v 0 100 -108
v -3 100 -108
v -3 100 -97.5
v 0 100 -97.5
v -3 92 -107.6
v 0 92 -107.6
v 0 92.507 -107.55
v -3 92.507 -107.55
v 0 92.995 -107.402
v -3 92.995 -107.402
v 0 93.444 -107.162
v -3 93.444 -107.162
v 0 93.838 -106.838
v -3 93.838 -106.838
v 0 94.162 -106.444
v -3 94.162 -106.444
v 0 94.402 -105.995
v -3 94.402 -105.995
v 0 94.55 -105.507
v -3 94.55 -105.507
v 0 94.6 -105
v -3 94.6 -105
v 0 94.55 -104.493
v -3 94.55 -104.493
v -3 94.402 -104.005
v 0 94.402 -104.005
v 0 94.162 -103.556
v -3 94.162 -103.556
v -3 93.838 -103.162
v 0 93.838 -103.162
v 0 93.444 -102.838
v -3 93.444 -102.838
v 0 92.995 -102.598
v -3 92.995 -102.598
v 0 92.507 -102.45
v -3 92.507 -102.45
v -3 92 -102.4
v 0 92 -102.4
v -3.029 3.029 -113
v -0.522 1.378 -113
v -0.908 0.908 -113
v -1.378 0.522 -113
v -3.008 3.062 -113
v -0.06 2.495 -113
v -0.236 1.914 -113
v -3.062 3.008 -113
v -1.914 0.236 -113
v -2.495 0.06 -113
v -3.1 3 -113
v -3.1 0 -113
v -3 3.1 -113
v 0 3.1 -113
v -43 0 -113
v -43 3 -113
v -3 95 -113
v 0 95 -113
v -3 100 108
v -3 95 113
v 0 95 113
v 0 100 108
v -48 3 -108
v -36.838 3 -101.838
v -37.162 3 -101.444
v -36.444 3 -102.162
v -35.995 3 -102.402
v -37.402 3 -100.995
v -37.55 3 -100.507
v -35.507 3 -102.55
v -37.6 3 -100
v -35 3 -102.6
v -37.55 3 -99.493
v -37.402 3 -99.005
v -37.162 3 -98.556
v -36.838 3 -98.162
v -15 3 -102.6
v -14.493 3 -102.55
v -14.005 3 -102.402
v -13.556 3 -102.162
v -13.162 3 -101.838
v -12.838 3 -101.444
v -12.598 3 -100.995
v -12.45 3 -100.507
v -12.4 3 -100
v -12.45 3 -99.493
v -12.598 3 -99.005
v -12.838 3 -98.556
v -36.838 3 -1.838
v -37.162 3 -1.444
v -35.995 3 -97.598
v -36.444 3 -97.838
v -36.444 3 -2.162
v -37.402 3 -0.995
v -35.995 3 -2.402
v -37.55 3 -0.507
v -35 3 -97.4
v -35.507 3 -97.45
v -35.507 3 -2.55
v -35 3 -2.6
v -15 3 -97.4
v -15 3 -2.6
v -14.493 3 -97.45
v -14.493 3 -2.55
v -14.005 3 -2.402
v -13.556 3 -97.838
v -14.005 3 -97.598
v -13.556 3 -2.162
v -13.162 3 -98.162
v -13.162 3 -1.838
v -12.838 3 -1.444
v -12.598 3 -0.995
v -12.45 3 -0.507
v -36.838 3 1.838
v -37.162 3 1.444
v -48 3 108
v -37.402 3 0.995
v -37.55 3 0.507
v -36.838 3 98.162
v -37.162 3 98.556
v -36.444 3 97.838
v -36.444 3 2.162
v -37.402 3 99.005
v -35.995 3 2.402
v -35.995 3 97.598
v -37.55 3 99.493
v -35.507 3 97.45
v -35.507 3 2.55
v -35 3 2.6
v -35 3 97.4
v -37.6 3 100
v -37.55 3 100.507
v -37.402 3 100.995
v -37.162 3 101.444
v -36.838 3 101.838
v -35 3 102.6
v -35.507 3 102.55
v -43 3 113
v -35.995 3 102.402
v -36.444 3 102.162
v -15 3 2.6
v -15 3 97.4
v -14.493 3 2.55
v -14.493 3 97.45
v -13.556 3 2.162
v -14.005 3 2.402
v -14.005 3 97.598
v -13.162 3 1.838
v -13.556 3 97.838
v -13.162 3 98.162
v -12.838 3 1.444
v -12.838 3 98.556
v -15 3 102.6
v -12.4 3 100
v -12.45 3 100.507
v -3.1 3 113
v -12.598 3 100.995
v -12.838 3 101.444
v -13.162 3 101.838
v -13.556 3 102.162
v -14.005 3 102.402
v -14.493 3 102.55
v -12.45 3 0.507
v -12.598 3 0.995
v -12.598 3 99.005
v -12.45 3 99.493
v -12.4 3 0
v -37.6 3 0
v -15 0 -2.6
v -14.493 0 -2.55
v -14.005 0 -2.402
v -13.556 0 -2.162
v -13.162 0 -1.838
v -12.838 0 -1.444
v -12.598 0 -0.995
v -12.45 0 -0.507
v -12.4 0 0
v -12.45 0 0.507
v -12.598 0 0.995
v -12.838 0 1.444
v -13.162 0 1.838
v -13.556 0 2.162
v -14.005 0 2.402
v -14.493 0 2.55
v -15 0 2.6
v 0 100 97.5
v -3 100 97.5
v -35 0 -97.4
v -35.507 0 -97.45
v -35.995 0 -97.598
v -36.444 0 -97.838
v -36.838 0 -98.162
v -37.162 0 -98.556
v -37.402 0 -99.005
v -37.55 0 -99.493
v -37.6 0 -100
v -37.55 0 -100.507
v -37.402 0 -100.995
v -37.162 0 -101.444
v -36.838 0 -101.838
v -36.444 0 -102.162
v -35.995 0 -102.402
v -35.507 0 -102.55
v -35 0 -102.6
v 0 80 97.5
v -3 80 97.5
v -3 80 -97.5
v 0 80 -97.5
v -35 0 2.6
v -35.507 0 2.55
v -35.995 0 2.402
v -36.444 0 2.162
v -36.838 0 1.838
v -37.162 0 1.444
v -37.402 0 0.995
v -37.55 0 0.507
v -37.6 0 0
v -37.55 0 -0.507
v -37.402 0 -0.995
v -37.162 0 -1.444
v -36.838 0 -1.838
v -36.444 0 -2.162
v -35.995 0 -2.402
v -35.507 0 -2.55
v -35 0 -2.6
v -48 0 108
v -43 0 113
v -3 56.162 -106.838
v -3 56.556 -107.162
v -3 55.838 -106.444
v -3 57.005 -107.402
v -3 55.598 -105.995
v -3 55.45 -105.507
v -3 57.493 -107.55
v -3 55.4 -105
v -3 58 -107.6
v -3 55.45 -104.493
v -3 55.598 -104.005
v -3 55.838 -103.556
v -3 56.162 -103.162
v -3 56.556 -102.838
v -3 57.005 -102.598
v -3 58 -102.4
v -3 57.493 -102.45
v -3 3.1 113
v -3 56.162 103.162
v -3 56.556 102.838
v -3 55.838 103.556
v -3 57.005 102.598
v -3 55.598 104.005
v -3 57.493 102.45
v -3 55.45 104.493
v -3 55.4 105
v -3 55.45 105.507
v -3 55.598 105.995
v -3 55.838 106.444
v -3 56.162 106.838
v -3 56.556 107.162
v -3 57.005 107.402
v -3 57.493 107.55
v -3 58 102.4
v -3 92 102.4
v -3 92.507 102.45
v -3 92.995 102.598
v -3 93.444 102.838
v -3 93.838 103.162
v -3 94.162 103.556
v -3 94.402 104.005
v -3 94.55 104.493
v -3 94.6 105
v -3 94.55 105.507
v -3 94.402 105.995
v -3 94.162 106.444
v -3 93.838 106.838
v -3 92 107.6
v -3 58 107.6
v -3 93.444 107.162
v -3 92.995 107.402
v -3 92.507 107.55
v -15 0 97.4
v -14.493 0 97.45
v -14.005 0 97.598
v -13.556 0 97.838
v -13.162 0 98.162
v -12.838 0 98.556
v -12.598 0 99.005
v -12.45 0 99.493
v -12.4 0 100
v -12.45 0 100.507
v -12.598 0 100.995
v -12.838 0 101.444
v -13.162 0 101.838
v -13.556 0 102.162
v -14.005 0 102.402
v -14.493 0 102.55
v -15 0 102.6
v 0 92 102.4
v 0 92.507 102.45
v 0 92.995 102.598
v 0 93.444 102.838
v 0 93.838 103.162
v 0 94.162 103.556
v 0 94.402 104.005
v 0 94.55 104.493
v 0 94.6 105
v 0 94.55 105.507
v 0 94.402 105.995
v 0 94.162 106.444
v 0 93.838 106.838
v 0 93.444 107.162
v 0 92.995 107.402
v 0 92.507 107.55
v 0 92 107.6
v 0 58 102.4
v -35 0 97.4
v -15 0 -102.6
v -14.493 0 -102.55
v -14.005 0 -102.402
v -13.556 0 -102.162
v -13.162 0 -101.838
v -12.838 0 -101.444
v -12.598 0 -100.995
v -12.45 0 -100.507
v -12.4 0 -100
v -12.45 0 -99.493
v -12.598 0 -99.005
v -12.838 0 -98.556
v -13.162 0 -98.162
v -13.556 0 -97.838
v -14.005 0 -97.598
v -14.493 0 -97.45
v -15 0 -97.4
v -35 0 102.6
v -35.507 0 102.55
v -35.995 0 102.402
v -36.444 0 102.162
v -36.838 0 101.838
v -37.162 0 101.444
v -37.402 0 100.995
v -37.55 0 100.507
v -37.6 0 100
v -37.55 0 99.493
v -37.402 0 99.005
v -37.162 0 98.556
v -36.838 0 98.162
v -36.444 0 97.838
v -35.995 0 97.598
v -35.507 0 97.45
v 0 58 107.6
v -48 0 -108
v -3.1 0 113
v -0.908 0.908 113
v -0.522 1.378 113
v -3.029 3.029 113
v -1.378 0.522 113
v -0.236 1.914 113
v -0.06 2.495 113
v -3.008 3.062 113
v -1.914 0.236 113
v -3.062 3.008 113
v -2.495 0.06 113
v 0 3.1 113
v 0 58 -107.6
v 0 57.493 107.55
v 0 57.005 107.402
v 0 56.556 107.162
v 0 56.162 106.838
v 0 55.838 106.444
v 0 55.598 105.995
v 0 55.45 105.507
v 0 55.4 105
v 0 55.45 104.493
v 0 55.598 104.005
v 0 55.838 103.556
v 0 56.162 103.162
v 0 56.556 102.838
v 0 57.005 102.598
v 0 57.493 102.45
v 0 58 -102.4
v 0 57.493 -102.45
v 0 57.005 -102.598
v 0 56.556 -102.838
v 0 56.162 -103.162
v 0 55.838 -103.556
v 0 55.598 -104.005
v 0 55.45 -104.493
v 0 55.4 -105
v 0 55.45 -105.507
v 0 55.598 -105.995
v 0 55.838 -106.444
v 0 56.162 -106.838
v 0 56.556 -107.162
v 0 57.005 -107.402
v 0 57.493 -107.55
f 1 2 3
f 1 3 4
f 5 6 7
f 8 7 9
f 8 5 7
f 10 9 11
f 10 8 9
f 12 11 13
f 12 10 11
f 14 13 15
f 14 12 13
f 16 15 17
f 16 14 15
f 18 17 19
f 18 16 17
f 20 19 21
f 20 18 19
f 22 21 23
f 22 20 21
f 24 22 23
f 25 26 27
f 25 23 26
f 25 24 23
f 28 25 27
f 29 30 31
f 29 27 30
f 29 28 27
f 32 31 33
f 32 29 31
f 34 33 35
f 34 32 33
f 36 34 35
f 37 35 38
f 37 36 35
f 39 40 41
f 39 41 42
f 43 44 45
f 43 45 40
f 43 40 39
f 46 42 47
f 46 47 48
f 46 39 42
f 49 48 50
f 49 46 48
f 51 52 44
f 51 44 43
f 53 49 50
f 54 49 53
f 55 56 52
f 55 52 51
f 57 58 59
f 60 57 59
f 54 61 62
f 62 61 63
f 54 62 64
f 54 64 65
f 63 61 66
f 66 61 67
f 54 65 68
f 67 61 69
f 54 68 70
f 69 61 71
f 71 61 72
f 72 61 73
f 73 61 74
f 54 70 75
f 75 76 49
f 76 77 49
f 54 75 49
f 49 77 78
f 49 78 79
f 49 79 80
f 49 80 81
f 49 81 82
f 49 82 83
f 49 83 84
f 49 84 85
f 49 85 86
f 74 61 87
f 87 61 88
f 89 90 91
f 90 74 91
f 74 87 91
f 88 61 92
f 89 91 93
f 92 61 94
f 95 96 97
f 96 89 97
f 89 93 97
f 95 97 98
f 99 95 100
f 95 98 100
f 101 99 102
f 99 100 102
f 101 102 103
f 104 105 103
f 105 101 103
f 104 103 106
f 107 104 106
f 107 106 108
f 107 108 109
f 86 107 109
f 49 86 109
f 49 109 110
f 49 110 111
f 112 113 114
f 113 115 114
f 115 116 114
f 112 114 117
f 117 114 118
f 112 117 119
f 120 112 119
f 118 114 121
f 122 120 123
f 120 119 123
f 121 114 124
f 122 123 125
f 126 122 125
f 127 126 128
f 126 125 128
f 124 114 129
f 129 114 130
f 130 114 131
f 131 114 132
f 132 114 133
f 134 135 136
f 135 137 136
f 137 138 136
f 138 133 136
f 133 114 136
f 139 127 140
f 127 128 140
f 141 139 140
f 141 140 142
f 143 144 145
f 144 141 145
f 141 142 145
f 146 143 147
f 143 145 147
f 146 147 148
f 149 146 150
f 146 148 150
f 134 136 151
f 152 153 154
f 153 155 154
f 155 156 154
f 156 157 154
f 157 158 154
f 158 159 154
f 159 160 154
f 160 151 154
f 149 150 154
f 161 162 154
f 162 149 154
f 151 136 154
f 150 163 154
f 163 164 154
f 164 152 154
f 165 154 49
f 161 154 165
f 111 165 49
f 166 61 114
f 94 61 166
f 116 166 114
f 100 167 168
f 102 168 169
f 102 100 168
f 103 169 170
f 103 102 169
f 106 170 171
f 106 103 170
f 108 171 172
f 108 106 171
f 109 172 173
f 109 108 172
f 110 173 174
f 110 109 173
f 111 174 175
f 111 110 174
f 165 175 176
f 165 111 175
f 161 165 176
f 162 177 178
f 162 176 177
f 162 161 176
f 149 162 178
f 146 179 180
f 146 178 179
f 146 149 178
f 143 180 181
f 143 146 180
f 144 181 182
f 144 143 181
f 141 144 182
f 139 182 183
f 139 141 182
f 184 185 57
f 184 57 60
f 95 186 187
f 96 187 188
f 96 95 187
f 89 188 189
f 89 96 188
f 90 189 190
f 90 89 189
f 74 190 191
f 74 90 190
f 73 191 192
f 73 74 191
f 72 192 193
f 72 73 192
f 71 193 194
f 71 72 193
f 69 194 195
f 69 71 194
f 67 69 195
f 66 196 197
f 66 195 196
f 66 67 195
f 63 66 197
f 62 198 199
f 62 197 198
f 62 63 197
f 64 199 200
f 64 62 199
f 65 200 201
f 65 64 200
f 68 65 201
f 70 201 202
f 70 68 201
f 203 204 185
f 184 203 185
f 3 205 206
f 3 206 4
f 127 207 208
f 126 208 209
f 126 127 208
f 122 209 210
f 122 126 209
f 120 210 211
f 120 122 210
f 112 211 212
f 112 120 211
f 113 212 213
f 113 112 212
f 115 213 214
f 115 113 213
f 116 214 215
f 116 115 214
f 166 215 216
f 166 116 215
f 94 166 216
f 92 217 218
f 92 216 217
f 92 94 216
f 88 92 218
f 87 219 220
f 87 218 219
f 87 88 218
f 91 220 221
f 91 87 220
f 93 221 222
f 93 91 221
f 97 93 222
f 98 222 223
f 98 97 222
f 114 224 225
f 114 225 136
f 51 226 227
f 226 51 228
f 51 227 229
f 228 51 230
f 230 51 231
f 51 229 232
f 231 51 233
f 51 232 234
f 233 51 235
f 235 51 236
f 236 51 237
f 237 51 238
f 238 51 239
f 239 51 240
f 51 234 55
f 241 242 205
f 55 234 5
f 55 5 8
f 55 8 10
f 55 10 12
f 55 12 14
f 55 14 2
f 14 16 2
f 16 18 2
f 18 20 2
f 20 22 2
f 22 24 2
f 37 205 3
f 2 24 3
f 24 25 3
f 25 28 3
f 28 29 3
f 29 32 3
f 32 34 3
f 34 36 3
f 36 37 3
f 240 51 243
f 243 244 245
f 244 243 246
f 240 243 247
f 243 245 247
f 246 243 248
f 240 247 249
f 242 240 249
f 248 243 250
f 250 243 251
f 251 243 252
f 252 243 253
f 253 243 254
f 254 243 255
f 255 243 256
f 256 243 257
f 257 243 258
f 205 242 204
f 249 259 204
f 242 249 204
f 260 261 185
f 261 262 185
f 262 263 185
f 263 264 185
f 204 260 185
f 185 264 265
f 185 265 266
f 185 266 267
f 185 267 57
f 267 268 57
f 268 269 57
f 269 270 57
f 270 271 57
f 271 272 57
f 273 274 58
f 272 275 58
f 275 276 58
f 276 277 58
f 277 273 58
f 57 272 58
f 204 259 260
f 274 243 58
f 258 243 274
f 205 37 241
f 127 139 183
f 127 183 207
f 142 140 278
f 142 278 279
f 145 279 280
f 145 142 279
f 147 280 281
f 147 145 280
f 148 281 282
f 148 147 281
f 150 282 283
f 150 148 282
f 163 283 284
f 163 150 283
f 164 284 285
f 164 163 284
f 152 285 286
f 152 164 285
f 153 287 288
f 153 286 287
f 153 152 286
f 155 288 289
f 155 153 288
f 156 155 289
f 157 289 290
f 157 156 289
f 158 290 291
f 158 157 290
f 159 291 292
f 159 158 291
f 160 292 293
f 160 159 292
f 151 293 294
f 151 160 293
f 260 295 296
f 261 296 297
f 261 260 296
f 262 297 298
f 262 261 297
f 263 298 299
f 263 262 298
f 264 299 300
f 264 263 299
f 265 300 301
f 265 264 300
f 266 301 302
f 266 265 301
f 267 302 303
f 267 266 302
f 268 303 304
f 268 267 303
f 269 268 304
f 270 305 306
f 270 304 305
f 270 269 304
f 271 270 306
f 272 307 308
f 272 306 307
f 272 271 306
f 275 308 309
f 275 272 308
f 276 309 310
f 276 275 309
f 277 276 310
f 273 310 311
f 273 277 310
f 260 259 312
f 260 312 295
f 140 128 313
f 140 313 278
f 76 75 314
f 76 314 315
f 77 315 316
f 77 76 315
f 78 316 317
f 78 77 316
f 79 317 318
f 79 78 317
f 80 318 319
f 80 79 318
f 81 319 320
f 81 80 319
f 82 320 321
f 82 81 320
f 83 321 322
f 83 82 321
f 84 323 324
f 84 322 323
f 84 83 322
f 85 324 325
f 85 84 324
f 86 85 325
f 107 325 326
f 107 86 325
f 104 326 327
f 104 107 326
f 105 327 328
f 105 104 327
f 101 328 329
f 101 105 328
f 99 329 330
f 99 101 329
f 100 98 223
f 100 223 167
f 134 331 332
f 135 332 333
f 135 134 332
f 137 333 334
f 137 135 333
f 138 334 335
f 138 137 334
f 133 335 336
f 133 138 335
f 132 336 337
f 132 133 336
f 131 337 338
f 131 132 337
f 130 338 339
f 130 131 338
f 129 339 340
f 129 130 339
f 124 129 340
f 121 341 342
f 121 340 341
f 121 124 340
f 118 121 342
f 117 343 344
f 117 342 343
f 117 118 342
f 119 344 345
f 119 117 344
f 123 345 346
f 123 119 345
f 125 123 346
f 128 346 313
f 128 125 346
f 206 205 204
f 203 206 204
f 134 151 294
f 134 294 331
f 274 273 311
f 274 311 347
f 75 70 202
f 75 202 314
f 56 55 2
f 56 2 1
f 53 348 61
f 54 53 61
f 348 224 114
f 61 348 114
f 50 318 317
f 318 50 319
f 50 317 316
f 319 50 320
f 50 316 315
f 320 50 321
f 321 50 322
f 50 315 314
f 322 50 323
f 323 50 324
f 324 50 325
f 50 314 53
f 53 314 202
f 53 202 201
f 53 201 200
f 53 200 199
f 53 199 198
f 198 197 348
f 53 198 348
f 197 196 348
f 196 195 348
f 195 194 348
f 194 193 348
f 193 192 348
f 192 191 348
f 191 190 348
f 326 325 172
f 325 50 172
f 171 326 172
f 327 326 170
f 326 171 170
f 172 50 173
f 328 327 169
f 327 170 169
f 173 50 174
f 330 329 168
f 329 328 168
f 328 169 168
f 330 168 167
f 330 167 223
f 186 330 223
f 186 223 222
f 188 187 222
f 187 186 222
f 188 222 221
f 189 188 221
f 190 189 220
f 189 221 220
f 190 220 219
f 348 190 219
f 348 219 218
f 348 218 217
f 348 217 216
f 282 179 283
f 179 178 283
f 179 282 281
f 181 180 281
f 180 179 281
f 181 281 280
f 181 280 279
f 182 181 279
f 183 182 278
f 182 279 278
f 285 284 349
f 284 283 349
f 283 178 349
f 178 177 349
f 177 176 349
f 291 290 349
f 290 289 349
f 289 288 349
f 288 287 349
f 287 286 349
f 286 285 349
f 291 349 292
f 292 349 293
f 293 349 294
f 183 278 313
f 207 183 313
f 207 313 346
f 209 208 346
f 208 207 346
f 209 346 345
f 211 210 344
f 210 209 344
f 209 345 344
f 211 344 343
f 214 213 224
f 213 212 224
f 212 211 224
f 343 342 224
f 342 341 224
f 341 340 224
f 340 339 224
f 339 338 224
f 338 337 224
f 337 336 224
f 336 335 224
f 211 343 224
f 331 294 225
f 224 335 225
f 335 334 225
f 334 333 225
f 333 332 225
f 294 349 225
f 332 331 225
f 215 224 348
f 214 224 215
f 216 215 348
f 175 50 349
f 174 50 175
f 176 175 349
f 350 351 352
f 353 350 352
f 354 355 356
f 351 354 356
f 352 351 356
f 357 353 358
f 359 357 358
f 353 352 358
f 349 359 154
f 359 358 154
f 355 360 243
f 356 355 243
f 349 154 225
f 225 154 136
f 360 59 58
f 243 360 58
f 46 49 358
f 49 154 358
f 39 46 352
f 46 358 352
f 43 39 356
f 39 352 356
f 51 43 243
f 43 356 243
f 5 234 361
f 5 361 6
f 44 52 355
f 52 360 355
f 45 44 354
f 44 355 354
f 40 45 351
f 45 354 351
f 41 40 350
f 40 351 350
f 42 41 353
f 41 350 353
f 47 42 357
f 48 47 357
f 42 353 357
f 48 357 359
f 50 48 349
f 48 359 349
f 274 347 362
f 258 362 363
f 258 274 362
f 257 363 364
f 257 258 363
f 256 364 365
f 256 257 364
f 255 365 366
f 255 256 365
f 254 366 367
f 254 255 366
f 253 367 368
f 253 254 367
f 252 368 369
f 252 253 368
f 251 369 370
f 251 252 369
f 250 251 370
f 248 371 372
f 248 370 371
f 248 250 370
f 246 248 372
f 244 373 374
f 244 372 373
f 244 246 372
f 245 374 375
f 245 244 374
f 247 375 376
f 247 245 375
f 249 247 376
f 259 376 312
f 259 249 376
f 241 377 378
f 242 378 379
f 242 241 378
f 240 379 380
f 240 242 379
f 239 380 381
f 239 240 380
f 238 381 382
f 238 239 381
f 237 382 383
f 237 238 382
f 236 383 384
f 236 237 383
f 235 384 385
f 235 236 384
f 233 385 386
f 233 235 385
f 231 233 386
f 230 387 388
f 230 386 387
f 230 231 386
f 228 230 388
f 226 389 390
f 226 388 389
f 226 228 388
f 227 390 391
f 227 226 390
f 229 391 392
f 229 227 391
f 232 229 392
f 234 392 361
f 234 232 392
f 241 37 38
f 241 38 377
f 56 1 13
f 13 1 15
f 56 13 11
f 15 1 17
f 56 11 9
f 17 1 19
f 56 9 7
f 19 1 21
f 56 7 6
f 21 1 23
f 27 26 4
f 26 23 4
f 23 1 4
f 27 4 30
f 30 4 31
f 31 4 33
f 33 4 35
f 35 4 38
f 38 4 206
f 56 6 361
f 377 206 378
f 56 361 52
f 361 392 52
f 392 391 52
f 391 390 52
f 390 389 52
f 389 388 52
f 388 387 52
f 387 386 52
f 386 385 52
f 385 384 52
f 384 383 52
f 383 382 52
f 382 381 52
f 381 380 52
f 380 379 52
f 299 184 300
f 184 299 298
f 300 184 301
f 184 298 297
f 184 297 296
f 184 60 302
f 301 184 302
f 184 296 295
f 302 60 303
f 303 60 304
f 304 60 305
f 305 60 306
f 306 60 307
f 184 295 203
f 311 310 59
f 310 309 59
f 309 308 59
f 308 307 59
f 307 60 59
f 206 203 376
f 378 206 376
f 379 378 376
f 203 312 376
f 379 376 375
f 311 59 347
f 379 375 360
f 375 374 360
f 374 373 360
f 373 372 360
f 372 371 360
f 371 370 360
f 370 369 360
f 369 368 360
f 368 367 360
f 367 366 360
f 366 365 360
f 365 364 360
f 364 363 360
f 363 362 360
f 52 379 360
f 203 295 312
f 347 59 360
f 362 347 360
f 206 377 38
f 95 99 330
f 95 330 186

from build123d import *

# Parameters (mm, degrees)
SM_BASE_FLANGE_1_DEPTH = 113
CUT_EXTRUDE_1_DEPTH    = 10
CUT_EXTRUDE_2_DEPTH    = 10
CHAMFER_1_SIZE         = 5
SKETCH_8_W             = 195
SKETCH_8_H             = 40
CUT_EXTRUDE_3_DEPTH    = 10


# Sheet-metal steps are written as plain solids
with BuildPart() as part:
    # Sketch 1 → 基体-法兰1 (new, symmetric)
    with BuildSketch(Plane.XY):
        with BuildLine():
            Line((0, 100), (0, 3.1))
            ThreePointArc((0, 3.1), (-0.907968978, 0.907968978), (-3.1, 0))
            Line((-3.1, 0), (-48, 0))
            Line((-48, 0), (-48, 3))
            Line((-48, 3), (-3.1, 3))
            ThreePointArc((-3.1, 3), (-3.029289322, 3.029289322), (-3, 3.1))
            Line((-3, 3.1), (-3, 100))
            Line((-3, 100), (0, 100))
        make_face()
    extrude(amount=SM_BASE_FLANGE_1_DEPTH, both=True)

    # 草图6 → 切除-拉伸1 (cut)
    with BuildSketch(Plane.ZY.offset(3)):
        with BuildLine():
            Line((-102.4, 92), (-102.4, 58))
            ThreePointArc((-102.4, 58), (-105, 55.4), (-107.6, 58))
            Line((-107.6, 58), (-107.6, 92))
            ThreePointArc((-107.6, 92), (-105, 94.6), (-102.4, 92))
        make_face()
        with BuildLine():
            Line((107.6, 92), (107.6, 58))
            ThreePointArc((107.6, 58), (105, 55.4), (102.4, 58))
            Line((102.4, 58), (102.4, 92))
            ThreePointArc((102.4, 92), (105, 94.6), (107.6, 92))
        make_face()
    extrude(amount=-CUT_EXTRUDE_1_DEPTH, mode=Mode.SUBTRACT)

    # 草图7 → 切除-拉伸2 (cut)
    with BuildSketch(Plane(origin=(0, 3, 0), x_dir=(1, 0, 0), z_dir=(0, 1, 0))):
        with BuildLine():
            Line((-35, 102.6), (-15, 102.6))
            ThreePointArc((-15, 102.6), (-12.4, 100), (-15, 97.4))
            Line((-15, 97.4), (-35, 97.4))
            ThreePointArc((-35, 97.4), (-37.6, 100), (-35, 102.6))
        make_face()
        with BuildLine():
            Line((-35, 2.6), (-15, 2.6))
            ThreePointArc((-15, 2.6), (-12.4, 0), (-15, -2.6))
            Line((-15, -2.6), (-35, -2.6))
            ThreePointArc((-35, -2.6), (-37.6, 0), (-35, 2.6))
        make_face()
        with BuildLine():
            Line((-35, -97.4), (-15, -97.4))
            ThreePointArc((-15, -97.4), (-12.4, -100), (-15, -102.6))
            Line((-15, -102.6), (-35, -102.6))
            ThreePointArc((-35, -102.6), (-37.6, -100), (-35, -97.4))
        make_face()
    extrude(amount=-CUT_EXTRUDE_2_DEPTH, mode=Mode.SUBTRACT)

    # 倒角1
    chamfer_1_edges = [part.edges().sort_by_distance(p)[0] for p in [
        (-1.5, 100, 113),
        (-48, 1.5, 113),
        (-1.5, 100, -113),
        (-48, 1.5, -113),
    ]]
    chamfer(chamfer_1_edges, length=CHAMFER_1_SIZE)

    # 草图8 → 切除-拉伸3 (cut)
    with BuildSketch(Plane.ZY.offset(3)):
        with Locations((0, 100)):
            Rectangle(SKETCH_8_W, SKETCH_8_H)
    extrude(amount=-CUT_EXTRUDE_3_DEPTH, mode=Mode.SUBTRACT)


solid = part.part
